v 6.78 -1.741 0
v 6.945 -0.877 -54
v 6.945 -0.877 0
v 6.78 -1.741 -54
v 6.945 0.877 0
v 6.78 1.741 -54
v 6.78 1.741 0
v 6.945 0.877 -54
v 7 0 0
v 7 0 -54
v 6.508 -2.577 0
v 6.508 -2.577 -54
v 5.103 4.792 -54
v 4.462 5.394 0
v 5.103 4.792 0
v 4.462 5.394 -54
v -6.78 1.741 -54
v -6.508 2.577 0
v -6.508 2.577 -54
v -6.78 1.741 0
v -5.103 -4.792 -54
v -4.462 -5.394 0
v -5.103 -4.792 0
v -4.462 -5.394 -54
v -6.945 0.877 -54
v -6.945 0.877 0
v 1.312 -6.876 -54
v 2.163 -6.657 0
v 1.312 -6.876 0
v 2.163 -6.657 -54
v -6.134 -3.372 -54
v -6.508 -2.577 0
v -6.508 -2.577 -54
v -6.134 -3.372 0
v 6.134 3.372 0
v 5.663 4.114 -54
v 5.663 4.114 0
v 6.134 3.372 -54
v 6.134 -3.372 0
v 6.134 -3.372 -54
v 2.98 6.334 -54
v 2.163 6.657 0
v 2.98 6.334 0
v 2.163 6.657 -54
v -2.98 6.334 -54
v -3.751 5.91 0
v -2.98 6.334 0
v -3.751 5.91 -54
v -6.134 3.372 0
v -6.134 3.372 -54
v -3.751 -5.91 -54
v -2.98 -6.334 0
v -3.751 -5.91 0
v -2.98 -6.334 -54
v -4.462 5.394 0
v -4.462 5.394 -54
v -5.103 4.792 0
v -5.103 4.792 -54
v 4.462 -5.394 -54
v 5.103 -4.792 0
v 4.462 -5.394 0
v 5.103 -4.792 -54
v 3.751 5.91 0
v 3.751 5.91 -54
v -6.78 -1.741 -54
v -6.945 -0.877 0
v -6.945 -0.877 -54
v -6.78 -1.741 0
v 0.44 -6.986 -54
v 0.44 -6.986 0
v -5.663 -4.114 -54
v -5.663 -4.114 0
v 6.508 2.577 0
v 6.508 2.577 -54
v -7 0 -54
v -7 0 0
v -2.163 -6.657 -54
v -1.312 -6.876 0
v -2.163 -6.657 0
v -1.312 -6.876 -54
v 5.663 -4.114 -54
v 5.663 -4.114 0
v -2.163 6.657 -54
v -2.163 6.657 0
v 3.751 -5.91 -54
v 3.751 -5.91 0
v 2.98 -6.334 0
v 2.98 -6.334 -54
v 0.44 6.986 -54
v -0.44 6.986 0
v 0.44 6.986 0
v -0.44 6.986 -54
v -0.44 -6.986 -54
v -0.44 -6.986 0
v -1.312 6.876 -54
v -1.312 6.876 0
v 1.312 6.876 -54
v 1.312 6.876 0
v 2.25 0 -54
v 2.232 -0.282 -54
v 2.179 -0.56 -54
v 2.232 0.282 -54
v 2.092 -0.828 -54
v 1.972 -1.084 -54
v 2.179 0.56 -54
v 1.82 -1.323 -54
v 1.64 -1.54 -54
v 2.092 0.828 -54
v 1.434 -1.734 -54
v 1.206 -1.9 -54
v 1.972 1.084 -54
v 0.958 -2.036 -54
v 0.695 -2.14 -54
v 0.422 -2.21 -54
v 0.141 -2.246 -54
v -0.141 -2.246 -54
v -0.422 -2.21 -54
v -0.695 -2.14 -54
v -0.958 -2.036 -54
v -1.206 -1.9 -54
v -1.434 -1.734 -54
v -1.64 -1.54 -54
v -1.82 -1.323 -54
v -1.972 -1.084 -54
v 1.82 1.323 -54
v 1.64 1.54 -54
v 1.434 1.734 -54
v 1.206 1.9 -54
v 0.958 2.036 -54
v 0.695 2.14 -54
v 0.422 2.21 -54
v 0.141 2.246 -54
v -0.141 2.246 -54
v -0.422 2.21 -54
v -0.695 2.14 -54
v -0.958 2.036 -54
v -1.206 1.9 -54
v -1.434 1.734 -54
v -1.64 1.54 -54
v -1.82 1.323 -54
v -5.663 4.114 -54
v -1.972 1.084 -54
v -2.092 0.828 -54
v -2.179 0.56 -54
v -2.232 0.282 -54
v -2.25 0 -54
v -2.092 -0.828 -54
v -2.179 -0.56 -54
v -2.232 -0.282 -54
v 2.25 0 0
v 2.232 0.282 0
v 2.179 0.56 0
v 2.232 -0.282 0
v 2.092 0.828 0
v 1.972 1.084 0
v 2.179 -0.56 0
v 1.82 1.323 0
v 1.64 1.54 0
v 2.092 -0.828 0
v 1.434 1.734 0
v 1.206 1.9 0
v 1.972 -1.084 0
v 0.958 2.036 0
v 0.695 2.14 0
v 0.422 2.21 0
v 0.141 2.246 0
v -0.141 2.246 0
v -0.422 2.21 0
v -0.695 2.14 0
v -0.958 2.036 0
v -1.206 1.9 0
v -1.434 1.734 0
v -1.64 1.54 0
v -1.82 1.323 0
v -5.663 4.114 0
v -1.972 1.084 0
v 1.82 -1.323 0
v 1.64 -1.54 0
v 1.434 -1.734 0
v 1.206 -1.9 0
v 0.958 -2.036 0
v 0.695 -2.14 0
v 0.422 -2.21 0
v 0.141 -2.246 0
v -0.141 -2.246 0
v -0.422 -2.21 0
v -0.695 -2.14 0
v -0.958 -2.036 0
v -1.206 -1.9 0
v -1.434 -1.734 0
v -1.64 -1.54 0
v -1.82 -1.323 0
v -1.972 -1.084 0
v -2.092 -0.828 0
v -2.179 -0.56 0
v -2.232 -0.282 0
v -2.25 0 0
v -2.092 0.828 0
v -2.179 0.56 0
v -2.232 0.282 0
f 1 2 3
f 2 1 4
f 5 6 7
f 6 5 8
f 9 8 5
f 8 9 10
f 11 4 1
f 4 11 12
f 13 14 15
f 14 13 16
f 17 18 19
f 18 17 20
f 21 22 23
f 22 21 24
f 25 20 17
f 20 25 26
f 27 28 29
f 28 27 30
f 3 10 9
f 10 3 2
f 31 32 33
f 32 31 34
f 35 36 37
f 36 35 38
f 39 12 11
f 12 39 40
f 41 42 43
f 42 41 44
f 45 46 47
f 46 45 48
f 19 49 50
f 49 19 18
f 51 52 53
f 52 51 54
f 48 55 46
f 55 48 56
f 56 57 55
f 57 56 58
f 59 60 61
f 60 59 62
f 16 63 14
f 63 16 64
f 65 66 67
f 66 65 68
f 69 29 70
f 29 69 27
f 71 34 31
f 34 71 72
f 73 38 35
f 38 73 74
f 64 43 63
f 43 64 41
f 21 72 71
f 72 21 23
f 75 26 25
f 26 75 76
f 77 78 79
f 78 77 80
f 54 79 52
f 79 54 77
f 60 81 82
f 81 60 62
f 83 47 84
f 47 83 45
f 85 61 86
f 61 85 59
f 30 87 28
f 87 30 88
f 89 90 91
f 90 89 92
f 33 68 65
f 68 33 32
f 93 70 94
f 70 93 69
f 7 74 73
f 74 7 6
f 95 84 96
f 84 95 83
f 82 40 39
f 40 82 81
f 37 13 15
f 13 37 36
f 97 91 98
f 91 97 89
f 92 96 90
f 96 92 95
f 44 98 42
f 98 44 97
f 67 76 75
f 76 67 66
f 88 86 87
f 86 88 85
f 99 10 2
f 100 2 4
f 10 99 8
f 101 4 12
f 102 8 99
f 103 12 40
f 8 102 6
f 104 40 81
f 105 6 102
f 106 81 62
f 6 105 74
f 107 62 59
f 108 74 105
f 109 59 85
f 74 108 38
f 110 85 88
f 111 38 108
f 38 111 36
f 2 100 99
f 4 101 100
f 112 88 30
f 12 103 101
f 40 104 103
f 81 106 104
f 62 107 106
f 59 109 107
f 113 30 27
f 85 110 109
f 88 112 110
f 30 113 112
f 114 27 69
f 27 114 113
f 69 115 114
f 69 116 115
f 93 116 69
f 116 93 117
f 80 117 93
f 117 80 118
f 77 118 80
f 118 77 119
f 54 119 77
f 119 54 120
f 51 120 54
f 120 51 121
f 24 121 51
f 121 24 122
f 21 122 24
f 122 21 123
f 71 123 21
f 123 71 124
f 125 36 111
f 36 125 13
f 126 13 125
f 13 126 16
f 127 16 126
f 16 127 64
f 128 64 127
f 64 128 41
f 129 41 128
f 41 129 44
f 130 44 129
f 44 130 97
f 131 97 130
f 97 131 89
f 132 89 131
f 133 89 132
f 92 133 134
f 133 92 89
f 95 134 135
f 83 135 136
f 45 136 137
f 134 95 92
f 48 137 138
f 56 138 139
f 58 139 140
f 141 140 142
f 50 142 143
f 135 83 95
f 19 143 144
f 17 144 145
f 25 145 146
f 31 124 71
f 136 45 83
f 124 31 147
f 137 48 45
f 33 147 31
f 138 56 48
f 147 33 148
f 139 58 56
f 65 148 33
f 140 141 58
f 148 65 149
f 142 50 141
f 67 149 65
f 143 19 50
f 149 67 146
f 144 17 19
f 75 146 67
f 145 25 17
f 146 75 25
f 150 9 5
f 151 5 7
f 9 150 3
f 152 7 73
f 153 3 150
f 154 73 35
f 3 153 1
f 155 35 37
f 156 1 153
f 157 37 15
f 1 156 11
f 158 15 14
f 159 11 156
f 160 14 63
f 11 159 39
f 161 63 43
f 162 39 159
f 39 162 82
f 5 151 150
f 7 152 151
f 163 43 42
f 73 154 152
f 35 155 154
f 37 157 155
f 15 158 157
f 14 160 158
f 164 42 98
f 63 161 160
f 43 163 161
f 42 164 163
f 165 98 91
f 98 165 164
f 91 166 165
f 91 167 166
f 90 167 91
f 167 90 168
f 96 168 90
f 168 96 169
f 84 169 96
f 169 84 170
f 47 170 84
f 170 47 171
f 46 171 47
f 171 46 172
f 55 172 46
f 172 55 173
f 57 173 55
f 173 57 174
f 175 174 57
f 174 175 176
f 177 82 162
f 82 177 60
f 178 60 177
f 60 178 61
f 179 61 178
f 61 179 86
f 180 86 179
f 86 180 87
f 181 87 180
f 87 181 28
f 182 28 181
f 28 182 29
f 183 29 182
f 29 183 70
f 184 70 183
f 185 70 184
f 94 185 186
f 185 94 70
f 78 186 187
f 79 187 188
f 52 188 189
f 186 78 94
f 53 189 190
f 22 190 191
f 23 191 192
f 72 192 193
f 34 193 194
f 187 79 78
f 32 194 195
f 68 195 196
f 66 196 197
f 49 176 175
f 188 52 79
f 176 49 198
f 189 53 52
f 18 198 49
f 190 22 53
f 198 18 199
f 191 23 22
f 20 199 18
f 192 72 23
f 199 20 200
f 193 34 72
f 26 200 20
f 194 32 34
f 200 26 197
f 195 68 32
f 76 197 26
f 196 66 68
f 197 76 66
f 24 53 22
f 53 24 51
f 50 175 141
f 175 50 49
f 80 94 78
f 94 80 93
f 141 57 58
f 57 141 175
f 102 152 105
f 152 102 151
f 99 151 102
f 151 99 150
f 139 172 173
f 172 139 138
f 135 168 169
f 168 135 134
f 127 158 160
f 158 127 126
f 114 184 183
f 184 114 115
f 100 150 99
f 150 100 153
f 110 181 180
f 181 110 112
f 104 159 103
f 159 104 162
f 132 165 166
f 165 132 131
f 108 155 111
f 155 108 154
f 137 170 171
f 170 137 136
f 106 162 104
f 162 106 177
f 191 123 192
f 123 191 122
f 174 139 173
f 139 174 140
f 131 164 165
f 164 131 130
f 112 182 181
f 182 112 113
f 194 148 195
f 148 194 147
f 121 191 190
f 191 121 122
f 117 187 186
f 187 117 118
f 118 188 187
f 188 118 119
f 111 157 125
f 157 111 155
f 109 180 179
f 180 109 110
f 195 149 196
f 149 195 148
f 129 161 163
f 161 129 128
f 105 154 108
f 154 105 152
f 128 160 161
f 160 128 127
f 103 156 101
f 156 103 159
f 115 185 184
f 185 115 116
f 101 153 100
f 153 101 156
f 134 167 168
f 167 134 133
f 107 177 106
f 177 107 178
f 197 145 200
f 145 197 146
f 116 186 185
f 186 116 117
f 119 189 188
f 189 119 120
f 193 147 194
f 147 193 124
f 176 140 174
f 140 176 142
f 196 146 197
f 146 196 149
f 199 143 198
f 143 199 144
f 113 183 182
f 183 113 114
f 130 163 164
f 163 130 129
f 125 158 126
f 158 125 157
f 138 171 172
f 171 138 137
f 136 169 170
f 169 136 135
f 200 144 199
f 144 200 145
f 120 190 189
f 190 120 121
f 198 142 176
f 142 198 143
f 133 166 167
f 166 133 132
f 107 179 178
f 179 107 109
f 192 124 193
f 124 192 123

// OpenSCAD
$fn = 50;


difference() {
	union() {
		translate(v = [0, 0, -54.0000000000]) {
			cylinder(h = 54, r = 7.0000000000);
		}
		cylinder(h = 0, r = 10.0000000000);
	}
	union() {
		#translate(v = [0, 0, -54]) {
			cylinder(h = 54, r = 2.2500000000);
		}
	}
}
